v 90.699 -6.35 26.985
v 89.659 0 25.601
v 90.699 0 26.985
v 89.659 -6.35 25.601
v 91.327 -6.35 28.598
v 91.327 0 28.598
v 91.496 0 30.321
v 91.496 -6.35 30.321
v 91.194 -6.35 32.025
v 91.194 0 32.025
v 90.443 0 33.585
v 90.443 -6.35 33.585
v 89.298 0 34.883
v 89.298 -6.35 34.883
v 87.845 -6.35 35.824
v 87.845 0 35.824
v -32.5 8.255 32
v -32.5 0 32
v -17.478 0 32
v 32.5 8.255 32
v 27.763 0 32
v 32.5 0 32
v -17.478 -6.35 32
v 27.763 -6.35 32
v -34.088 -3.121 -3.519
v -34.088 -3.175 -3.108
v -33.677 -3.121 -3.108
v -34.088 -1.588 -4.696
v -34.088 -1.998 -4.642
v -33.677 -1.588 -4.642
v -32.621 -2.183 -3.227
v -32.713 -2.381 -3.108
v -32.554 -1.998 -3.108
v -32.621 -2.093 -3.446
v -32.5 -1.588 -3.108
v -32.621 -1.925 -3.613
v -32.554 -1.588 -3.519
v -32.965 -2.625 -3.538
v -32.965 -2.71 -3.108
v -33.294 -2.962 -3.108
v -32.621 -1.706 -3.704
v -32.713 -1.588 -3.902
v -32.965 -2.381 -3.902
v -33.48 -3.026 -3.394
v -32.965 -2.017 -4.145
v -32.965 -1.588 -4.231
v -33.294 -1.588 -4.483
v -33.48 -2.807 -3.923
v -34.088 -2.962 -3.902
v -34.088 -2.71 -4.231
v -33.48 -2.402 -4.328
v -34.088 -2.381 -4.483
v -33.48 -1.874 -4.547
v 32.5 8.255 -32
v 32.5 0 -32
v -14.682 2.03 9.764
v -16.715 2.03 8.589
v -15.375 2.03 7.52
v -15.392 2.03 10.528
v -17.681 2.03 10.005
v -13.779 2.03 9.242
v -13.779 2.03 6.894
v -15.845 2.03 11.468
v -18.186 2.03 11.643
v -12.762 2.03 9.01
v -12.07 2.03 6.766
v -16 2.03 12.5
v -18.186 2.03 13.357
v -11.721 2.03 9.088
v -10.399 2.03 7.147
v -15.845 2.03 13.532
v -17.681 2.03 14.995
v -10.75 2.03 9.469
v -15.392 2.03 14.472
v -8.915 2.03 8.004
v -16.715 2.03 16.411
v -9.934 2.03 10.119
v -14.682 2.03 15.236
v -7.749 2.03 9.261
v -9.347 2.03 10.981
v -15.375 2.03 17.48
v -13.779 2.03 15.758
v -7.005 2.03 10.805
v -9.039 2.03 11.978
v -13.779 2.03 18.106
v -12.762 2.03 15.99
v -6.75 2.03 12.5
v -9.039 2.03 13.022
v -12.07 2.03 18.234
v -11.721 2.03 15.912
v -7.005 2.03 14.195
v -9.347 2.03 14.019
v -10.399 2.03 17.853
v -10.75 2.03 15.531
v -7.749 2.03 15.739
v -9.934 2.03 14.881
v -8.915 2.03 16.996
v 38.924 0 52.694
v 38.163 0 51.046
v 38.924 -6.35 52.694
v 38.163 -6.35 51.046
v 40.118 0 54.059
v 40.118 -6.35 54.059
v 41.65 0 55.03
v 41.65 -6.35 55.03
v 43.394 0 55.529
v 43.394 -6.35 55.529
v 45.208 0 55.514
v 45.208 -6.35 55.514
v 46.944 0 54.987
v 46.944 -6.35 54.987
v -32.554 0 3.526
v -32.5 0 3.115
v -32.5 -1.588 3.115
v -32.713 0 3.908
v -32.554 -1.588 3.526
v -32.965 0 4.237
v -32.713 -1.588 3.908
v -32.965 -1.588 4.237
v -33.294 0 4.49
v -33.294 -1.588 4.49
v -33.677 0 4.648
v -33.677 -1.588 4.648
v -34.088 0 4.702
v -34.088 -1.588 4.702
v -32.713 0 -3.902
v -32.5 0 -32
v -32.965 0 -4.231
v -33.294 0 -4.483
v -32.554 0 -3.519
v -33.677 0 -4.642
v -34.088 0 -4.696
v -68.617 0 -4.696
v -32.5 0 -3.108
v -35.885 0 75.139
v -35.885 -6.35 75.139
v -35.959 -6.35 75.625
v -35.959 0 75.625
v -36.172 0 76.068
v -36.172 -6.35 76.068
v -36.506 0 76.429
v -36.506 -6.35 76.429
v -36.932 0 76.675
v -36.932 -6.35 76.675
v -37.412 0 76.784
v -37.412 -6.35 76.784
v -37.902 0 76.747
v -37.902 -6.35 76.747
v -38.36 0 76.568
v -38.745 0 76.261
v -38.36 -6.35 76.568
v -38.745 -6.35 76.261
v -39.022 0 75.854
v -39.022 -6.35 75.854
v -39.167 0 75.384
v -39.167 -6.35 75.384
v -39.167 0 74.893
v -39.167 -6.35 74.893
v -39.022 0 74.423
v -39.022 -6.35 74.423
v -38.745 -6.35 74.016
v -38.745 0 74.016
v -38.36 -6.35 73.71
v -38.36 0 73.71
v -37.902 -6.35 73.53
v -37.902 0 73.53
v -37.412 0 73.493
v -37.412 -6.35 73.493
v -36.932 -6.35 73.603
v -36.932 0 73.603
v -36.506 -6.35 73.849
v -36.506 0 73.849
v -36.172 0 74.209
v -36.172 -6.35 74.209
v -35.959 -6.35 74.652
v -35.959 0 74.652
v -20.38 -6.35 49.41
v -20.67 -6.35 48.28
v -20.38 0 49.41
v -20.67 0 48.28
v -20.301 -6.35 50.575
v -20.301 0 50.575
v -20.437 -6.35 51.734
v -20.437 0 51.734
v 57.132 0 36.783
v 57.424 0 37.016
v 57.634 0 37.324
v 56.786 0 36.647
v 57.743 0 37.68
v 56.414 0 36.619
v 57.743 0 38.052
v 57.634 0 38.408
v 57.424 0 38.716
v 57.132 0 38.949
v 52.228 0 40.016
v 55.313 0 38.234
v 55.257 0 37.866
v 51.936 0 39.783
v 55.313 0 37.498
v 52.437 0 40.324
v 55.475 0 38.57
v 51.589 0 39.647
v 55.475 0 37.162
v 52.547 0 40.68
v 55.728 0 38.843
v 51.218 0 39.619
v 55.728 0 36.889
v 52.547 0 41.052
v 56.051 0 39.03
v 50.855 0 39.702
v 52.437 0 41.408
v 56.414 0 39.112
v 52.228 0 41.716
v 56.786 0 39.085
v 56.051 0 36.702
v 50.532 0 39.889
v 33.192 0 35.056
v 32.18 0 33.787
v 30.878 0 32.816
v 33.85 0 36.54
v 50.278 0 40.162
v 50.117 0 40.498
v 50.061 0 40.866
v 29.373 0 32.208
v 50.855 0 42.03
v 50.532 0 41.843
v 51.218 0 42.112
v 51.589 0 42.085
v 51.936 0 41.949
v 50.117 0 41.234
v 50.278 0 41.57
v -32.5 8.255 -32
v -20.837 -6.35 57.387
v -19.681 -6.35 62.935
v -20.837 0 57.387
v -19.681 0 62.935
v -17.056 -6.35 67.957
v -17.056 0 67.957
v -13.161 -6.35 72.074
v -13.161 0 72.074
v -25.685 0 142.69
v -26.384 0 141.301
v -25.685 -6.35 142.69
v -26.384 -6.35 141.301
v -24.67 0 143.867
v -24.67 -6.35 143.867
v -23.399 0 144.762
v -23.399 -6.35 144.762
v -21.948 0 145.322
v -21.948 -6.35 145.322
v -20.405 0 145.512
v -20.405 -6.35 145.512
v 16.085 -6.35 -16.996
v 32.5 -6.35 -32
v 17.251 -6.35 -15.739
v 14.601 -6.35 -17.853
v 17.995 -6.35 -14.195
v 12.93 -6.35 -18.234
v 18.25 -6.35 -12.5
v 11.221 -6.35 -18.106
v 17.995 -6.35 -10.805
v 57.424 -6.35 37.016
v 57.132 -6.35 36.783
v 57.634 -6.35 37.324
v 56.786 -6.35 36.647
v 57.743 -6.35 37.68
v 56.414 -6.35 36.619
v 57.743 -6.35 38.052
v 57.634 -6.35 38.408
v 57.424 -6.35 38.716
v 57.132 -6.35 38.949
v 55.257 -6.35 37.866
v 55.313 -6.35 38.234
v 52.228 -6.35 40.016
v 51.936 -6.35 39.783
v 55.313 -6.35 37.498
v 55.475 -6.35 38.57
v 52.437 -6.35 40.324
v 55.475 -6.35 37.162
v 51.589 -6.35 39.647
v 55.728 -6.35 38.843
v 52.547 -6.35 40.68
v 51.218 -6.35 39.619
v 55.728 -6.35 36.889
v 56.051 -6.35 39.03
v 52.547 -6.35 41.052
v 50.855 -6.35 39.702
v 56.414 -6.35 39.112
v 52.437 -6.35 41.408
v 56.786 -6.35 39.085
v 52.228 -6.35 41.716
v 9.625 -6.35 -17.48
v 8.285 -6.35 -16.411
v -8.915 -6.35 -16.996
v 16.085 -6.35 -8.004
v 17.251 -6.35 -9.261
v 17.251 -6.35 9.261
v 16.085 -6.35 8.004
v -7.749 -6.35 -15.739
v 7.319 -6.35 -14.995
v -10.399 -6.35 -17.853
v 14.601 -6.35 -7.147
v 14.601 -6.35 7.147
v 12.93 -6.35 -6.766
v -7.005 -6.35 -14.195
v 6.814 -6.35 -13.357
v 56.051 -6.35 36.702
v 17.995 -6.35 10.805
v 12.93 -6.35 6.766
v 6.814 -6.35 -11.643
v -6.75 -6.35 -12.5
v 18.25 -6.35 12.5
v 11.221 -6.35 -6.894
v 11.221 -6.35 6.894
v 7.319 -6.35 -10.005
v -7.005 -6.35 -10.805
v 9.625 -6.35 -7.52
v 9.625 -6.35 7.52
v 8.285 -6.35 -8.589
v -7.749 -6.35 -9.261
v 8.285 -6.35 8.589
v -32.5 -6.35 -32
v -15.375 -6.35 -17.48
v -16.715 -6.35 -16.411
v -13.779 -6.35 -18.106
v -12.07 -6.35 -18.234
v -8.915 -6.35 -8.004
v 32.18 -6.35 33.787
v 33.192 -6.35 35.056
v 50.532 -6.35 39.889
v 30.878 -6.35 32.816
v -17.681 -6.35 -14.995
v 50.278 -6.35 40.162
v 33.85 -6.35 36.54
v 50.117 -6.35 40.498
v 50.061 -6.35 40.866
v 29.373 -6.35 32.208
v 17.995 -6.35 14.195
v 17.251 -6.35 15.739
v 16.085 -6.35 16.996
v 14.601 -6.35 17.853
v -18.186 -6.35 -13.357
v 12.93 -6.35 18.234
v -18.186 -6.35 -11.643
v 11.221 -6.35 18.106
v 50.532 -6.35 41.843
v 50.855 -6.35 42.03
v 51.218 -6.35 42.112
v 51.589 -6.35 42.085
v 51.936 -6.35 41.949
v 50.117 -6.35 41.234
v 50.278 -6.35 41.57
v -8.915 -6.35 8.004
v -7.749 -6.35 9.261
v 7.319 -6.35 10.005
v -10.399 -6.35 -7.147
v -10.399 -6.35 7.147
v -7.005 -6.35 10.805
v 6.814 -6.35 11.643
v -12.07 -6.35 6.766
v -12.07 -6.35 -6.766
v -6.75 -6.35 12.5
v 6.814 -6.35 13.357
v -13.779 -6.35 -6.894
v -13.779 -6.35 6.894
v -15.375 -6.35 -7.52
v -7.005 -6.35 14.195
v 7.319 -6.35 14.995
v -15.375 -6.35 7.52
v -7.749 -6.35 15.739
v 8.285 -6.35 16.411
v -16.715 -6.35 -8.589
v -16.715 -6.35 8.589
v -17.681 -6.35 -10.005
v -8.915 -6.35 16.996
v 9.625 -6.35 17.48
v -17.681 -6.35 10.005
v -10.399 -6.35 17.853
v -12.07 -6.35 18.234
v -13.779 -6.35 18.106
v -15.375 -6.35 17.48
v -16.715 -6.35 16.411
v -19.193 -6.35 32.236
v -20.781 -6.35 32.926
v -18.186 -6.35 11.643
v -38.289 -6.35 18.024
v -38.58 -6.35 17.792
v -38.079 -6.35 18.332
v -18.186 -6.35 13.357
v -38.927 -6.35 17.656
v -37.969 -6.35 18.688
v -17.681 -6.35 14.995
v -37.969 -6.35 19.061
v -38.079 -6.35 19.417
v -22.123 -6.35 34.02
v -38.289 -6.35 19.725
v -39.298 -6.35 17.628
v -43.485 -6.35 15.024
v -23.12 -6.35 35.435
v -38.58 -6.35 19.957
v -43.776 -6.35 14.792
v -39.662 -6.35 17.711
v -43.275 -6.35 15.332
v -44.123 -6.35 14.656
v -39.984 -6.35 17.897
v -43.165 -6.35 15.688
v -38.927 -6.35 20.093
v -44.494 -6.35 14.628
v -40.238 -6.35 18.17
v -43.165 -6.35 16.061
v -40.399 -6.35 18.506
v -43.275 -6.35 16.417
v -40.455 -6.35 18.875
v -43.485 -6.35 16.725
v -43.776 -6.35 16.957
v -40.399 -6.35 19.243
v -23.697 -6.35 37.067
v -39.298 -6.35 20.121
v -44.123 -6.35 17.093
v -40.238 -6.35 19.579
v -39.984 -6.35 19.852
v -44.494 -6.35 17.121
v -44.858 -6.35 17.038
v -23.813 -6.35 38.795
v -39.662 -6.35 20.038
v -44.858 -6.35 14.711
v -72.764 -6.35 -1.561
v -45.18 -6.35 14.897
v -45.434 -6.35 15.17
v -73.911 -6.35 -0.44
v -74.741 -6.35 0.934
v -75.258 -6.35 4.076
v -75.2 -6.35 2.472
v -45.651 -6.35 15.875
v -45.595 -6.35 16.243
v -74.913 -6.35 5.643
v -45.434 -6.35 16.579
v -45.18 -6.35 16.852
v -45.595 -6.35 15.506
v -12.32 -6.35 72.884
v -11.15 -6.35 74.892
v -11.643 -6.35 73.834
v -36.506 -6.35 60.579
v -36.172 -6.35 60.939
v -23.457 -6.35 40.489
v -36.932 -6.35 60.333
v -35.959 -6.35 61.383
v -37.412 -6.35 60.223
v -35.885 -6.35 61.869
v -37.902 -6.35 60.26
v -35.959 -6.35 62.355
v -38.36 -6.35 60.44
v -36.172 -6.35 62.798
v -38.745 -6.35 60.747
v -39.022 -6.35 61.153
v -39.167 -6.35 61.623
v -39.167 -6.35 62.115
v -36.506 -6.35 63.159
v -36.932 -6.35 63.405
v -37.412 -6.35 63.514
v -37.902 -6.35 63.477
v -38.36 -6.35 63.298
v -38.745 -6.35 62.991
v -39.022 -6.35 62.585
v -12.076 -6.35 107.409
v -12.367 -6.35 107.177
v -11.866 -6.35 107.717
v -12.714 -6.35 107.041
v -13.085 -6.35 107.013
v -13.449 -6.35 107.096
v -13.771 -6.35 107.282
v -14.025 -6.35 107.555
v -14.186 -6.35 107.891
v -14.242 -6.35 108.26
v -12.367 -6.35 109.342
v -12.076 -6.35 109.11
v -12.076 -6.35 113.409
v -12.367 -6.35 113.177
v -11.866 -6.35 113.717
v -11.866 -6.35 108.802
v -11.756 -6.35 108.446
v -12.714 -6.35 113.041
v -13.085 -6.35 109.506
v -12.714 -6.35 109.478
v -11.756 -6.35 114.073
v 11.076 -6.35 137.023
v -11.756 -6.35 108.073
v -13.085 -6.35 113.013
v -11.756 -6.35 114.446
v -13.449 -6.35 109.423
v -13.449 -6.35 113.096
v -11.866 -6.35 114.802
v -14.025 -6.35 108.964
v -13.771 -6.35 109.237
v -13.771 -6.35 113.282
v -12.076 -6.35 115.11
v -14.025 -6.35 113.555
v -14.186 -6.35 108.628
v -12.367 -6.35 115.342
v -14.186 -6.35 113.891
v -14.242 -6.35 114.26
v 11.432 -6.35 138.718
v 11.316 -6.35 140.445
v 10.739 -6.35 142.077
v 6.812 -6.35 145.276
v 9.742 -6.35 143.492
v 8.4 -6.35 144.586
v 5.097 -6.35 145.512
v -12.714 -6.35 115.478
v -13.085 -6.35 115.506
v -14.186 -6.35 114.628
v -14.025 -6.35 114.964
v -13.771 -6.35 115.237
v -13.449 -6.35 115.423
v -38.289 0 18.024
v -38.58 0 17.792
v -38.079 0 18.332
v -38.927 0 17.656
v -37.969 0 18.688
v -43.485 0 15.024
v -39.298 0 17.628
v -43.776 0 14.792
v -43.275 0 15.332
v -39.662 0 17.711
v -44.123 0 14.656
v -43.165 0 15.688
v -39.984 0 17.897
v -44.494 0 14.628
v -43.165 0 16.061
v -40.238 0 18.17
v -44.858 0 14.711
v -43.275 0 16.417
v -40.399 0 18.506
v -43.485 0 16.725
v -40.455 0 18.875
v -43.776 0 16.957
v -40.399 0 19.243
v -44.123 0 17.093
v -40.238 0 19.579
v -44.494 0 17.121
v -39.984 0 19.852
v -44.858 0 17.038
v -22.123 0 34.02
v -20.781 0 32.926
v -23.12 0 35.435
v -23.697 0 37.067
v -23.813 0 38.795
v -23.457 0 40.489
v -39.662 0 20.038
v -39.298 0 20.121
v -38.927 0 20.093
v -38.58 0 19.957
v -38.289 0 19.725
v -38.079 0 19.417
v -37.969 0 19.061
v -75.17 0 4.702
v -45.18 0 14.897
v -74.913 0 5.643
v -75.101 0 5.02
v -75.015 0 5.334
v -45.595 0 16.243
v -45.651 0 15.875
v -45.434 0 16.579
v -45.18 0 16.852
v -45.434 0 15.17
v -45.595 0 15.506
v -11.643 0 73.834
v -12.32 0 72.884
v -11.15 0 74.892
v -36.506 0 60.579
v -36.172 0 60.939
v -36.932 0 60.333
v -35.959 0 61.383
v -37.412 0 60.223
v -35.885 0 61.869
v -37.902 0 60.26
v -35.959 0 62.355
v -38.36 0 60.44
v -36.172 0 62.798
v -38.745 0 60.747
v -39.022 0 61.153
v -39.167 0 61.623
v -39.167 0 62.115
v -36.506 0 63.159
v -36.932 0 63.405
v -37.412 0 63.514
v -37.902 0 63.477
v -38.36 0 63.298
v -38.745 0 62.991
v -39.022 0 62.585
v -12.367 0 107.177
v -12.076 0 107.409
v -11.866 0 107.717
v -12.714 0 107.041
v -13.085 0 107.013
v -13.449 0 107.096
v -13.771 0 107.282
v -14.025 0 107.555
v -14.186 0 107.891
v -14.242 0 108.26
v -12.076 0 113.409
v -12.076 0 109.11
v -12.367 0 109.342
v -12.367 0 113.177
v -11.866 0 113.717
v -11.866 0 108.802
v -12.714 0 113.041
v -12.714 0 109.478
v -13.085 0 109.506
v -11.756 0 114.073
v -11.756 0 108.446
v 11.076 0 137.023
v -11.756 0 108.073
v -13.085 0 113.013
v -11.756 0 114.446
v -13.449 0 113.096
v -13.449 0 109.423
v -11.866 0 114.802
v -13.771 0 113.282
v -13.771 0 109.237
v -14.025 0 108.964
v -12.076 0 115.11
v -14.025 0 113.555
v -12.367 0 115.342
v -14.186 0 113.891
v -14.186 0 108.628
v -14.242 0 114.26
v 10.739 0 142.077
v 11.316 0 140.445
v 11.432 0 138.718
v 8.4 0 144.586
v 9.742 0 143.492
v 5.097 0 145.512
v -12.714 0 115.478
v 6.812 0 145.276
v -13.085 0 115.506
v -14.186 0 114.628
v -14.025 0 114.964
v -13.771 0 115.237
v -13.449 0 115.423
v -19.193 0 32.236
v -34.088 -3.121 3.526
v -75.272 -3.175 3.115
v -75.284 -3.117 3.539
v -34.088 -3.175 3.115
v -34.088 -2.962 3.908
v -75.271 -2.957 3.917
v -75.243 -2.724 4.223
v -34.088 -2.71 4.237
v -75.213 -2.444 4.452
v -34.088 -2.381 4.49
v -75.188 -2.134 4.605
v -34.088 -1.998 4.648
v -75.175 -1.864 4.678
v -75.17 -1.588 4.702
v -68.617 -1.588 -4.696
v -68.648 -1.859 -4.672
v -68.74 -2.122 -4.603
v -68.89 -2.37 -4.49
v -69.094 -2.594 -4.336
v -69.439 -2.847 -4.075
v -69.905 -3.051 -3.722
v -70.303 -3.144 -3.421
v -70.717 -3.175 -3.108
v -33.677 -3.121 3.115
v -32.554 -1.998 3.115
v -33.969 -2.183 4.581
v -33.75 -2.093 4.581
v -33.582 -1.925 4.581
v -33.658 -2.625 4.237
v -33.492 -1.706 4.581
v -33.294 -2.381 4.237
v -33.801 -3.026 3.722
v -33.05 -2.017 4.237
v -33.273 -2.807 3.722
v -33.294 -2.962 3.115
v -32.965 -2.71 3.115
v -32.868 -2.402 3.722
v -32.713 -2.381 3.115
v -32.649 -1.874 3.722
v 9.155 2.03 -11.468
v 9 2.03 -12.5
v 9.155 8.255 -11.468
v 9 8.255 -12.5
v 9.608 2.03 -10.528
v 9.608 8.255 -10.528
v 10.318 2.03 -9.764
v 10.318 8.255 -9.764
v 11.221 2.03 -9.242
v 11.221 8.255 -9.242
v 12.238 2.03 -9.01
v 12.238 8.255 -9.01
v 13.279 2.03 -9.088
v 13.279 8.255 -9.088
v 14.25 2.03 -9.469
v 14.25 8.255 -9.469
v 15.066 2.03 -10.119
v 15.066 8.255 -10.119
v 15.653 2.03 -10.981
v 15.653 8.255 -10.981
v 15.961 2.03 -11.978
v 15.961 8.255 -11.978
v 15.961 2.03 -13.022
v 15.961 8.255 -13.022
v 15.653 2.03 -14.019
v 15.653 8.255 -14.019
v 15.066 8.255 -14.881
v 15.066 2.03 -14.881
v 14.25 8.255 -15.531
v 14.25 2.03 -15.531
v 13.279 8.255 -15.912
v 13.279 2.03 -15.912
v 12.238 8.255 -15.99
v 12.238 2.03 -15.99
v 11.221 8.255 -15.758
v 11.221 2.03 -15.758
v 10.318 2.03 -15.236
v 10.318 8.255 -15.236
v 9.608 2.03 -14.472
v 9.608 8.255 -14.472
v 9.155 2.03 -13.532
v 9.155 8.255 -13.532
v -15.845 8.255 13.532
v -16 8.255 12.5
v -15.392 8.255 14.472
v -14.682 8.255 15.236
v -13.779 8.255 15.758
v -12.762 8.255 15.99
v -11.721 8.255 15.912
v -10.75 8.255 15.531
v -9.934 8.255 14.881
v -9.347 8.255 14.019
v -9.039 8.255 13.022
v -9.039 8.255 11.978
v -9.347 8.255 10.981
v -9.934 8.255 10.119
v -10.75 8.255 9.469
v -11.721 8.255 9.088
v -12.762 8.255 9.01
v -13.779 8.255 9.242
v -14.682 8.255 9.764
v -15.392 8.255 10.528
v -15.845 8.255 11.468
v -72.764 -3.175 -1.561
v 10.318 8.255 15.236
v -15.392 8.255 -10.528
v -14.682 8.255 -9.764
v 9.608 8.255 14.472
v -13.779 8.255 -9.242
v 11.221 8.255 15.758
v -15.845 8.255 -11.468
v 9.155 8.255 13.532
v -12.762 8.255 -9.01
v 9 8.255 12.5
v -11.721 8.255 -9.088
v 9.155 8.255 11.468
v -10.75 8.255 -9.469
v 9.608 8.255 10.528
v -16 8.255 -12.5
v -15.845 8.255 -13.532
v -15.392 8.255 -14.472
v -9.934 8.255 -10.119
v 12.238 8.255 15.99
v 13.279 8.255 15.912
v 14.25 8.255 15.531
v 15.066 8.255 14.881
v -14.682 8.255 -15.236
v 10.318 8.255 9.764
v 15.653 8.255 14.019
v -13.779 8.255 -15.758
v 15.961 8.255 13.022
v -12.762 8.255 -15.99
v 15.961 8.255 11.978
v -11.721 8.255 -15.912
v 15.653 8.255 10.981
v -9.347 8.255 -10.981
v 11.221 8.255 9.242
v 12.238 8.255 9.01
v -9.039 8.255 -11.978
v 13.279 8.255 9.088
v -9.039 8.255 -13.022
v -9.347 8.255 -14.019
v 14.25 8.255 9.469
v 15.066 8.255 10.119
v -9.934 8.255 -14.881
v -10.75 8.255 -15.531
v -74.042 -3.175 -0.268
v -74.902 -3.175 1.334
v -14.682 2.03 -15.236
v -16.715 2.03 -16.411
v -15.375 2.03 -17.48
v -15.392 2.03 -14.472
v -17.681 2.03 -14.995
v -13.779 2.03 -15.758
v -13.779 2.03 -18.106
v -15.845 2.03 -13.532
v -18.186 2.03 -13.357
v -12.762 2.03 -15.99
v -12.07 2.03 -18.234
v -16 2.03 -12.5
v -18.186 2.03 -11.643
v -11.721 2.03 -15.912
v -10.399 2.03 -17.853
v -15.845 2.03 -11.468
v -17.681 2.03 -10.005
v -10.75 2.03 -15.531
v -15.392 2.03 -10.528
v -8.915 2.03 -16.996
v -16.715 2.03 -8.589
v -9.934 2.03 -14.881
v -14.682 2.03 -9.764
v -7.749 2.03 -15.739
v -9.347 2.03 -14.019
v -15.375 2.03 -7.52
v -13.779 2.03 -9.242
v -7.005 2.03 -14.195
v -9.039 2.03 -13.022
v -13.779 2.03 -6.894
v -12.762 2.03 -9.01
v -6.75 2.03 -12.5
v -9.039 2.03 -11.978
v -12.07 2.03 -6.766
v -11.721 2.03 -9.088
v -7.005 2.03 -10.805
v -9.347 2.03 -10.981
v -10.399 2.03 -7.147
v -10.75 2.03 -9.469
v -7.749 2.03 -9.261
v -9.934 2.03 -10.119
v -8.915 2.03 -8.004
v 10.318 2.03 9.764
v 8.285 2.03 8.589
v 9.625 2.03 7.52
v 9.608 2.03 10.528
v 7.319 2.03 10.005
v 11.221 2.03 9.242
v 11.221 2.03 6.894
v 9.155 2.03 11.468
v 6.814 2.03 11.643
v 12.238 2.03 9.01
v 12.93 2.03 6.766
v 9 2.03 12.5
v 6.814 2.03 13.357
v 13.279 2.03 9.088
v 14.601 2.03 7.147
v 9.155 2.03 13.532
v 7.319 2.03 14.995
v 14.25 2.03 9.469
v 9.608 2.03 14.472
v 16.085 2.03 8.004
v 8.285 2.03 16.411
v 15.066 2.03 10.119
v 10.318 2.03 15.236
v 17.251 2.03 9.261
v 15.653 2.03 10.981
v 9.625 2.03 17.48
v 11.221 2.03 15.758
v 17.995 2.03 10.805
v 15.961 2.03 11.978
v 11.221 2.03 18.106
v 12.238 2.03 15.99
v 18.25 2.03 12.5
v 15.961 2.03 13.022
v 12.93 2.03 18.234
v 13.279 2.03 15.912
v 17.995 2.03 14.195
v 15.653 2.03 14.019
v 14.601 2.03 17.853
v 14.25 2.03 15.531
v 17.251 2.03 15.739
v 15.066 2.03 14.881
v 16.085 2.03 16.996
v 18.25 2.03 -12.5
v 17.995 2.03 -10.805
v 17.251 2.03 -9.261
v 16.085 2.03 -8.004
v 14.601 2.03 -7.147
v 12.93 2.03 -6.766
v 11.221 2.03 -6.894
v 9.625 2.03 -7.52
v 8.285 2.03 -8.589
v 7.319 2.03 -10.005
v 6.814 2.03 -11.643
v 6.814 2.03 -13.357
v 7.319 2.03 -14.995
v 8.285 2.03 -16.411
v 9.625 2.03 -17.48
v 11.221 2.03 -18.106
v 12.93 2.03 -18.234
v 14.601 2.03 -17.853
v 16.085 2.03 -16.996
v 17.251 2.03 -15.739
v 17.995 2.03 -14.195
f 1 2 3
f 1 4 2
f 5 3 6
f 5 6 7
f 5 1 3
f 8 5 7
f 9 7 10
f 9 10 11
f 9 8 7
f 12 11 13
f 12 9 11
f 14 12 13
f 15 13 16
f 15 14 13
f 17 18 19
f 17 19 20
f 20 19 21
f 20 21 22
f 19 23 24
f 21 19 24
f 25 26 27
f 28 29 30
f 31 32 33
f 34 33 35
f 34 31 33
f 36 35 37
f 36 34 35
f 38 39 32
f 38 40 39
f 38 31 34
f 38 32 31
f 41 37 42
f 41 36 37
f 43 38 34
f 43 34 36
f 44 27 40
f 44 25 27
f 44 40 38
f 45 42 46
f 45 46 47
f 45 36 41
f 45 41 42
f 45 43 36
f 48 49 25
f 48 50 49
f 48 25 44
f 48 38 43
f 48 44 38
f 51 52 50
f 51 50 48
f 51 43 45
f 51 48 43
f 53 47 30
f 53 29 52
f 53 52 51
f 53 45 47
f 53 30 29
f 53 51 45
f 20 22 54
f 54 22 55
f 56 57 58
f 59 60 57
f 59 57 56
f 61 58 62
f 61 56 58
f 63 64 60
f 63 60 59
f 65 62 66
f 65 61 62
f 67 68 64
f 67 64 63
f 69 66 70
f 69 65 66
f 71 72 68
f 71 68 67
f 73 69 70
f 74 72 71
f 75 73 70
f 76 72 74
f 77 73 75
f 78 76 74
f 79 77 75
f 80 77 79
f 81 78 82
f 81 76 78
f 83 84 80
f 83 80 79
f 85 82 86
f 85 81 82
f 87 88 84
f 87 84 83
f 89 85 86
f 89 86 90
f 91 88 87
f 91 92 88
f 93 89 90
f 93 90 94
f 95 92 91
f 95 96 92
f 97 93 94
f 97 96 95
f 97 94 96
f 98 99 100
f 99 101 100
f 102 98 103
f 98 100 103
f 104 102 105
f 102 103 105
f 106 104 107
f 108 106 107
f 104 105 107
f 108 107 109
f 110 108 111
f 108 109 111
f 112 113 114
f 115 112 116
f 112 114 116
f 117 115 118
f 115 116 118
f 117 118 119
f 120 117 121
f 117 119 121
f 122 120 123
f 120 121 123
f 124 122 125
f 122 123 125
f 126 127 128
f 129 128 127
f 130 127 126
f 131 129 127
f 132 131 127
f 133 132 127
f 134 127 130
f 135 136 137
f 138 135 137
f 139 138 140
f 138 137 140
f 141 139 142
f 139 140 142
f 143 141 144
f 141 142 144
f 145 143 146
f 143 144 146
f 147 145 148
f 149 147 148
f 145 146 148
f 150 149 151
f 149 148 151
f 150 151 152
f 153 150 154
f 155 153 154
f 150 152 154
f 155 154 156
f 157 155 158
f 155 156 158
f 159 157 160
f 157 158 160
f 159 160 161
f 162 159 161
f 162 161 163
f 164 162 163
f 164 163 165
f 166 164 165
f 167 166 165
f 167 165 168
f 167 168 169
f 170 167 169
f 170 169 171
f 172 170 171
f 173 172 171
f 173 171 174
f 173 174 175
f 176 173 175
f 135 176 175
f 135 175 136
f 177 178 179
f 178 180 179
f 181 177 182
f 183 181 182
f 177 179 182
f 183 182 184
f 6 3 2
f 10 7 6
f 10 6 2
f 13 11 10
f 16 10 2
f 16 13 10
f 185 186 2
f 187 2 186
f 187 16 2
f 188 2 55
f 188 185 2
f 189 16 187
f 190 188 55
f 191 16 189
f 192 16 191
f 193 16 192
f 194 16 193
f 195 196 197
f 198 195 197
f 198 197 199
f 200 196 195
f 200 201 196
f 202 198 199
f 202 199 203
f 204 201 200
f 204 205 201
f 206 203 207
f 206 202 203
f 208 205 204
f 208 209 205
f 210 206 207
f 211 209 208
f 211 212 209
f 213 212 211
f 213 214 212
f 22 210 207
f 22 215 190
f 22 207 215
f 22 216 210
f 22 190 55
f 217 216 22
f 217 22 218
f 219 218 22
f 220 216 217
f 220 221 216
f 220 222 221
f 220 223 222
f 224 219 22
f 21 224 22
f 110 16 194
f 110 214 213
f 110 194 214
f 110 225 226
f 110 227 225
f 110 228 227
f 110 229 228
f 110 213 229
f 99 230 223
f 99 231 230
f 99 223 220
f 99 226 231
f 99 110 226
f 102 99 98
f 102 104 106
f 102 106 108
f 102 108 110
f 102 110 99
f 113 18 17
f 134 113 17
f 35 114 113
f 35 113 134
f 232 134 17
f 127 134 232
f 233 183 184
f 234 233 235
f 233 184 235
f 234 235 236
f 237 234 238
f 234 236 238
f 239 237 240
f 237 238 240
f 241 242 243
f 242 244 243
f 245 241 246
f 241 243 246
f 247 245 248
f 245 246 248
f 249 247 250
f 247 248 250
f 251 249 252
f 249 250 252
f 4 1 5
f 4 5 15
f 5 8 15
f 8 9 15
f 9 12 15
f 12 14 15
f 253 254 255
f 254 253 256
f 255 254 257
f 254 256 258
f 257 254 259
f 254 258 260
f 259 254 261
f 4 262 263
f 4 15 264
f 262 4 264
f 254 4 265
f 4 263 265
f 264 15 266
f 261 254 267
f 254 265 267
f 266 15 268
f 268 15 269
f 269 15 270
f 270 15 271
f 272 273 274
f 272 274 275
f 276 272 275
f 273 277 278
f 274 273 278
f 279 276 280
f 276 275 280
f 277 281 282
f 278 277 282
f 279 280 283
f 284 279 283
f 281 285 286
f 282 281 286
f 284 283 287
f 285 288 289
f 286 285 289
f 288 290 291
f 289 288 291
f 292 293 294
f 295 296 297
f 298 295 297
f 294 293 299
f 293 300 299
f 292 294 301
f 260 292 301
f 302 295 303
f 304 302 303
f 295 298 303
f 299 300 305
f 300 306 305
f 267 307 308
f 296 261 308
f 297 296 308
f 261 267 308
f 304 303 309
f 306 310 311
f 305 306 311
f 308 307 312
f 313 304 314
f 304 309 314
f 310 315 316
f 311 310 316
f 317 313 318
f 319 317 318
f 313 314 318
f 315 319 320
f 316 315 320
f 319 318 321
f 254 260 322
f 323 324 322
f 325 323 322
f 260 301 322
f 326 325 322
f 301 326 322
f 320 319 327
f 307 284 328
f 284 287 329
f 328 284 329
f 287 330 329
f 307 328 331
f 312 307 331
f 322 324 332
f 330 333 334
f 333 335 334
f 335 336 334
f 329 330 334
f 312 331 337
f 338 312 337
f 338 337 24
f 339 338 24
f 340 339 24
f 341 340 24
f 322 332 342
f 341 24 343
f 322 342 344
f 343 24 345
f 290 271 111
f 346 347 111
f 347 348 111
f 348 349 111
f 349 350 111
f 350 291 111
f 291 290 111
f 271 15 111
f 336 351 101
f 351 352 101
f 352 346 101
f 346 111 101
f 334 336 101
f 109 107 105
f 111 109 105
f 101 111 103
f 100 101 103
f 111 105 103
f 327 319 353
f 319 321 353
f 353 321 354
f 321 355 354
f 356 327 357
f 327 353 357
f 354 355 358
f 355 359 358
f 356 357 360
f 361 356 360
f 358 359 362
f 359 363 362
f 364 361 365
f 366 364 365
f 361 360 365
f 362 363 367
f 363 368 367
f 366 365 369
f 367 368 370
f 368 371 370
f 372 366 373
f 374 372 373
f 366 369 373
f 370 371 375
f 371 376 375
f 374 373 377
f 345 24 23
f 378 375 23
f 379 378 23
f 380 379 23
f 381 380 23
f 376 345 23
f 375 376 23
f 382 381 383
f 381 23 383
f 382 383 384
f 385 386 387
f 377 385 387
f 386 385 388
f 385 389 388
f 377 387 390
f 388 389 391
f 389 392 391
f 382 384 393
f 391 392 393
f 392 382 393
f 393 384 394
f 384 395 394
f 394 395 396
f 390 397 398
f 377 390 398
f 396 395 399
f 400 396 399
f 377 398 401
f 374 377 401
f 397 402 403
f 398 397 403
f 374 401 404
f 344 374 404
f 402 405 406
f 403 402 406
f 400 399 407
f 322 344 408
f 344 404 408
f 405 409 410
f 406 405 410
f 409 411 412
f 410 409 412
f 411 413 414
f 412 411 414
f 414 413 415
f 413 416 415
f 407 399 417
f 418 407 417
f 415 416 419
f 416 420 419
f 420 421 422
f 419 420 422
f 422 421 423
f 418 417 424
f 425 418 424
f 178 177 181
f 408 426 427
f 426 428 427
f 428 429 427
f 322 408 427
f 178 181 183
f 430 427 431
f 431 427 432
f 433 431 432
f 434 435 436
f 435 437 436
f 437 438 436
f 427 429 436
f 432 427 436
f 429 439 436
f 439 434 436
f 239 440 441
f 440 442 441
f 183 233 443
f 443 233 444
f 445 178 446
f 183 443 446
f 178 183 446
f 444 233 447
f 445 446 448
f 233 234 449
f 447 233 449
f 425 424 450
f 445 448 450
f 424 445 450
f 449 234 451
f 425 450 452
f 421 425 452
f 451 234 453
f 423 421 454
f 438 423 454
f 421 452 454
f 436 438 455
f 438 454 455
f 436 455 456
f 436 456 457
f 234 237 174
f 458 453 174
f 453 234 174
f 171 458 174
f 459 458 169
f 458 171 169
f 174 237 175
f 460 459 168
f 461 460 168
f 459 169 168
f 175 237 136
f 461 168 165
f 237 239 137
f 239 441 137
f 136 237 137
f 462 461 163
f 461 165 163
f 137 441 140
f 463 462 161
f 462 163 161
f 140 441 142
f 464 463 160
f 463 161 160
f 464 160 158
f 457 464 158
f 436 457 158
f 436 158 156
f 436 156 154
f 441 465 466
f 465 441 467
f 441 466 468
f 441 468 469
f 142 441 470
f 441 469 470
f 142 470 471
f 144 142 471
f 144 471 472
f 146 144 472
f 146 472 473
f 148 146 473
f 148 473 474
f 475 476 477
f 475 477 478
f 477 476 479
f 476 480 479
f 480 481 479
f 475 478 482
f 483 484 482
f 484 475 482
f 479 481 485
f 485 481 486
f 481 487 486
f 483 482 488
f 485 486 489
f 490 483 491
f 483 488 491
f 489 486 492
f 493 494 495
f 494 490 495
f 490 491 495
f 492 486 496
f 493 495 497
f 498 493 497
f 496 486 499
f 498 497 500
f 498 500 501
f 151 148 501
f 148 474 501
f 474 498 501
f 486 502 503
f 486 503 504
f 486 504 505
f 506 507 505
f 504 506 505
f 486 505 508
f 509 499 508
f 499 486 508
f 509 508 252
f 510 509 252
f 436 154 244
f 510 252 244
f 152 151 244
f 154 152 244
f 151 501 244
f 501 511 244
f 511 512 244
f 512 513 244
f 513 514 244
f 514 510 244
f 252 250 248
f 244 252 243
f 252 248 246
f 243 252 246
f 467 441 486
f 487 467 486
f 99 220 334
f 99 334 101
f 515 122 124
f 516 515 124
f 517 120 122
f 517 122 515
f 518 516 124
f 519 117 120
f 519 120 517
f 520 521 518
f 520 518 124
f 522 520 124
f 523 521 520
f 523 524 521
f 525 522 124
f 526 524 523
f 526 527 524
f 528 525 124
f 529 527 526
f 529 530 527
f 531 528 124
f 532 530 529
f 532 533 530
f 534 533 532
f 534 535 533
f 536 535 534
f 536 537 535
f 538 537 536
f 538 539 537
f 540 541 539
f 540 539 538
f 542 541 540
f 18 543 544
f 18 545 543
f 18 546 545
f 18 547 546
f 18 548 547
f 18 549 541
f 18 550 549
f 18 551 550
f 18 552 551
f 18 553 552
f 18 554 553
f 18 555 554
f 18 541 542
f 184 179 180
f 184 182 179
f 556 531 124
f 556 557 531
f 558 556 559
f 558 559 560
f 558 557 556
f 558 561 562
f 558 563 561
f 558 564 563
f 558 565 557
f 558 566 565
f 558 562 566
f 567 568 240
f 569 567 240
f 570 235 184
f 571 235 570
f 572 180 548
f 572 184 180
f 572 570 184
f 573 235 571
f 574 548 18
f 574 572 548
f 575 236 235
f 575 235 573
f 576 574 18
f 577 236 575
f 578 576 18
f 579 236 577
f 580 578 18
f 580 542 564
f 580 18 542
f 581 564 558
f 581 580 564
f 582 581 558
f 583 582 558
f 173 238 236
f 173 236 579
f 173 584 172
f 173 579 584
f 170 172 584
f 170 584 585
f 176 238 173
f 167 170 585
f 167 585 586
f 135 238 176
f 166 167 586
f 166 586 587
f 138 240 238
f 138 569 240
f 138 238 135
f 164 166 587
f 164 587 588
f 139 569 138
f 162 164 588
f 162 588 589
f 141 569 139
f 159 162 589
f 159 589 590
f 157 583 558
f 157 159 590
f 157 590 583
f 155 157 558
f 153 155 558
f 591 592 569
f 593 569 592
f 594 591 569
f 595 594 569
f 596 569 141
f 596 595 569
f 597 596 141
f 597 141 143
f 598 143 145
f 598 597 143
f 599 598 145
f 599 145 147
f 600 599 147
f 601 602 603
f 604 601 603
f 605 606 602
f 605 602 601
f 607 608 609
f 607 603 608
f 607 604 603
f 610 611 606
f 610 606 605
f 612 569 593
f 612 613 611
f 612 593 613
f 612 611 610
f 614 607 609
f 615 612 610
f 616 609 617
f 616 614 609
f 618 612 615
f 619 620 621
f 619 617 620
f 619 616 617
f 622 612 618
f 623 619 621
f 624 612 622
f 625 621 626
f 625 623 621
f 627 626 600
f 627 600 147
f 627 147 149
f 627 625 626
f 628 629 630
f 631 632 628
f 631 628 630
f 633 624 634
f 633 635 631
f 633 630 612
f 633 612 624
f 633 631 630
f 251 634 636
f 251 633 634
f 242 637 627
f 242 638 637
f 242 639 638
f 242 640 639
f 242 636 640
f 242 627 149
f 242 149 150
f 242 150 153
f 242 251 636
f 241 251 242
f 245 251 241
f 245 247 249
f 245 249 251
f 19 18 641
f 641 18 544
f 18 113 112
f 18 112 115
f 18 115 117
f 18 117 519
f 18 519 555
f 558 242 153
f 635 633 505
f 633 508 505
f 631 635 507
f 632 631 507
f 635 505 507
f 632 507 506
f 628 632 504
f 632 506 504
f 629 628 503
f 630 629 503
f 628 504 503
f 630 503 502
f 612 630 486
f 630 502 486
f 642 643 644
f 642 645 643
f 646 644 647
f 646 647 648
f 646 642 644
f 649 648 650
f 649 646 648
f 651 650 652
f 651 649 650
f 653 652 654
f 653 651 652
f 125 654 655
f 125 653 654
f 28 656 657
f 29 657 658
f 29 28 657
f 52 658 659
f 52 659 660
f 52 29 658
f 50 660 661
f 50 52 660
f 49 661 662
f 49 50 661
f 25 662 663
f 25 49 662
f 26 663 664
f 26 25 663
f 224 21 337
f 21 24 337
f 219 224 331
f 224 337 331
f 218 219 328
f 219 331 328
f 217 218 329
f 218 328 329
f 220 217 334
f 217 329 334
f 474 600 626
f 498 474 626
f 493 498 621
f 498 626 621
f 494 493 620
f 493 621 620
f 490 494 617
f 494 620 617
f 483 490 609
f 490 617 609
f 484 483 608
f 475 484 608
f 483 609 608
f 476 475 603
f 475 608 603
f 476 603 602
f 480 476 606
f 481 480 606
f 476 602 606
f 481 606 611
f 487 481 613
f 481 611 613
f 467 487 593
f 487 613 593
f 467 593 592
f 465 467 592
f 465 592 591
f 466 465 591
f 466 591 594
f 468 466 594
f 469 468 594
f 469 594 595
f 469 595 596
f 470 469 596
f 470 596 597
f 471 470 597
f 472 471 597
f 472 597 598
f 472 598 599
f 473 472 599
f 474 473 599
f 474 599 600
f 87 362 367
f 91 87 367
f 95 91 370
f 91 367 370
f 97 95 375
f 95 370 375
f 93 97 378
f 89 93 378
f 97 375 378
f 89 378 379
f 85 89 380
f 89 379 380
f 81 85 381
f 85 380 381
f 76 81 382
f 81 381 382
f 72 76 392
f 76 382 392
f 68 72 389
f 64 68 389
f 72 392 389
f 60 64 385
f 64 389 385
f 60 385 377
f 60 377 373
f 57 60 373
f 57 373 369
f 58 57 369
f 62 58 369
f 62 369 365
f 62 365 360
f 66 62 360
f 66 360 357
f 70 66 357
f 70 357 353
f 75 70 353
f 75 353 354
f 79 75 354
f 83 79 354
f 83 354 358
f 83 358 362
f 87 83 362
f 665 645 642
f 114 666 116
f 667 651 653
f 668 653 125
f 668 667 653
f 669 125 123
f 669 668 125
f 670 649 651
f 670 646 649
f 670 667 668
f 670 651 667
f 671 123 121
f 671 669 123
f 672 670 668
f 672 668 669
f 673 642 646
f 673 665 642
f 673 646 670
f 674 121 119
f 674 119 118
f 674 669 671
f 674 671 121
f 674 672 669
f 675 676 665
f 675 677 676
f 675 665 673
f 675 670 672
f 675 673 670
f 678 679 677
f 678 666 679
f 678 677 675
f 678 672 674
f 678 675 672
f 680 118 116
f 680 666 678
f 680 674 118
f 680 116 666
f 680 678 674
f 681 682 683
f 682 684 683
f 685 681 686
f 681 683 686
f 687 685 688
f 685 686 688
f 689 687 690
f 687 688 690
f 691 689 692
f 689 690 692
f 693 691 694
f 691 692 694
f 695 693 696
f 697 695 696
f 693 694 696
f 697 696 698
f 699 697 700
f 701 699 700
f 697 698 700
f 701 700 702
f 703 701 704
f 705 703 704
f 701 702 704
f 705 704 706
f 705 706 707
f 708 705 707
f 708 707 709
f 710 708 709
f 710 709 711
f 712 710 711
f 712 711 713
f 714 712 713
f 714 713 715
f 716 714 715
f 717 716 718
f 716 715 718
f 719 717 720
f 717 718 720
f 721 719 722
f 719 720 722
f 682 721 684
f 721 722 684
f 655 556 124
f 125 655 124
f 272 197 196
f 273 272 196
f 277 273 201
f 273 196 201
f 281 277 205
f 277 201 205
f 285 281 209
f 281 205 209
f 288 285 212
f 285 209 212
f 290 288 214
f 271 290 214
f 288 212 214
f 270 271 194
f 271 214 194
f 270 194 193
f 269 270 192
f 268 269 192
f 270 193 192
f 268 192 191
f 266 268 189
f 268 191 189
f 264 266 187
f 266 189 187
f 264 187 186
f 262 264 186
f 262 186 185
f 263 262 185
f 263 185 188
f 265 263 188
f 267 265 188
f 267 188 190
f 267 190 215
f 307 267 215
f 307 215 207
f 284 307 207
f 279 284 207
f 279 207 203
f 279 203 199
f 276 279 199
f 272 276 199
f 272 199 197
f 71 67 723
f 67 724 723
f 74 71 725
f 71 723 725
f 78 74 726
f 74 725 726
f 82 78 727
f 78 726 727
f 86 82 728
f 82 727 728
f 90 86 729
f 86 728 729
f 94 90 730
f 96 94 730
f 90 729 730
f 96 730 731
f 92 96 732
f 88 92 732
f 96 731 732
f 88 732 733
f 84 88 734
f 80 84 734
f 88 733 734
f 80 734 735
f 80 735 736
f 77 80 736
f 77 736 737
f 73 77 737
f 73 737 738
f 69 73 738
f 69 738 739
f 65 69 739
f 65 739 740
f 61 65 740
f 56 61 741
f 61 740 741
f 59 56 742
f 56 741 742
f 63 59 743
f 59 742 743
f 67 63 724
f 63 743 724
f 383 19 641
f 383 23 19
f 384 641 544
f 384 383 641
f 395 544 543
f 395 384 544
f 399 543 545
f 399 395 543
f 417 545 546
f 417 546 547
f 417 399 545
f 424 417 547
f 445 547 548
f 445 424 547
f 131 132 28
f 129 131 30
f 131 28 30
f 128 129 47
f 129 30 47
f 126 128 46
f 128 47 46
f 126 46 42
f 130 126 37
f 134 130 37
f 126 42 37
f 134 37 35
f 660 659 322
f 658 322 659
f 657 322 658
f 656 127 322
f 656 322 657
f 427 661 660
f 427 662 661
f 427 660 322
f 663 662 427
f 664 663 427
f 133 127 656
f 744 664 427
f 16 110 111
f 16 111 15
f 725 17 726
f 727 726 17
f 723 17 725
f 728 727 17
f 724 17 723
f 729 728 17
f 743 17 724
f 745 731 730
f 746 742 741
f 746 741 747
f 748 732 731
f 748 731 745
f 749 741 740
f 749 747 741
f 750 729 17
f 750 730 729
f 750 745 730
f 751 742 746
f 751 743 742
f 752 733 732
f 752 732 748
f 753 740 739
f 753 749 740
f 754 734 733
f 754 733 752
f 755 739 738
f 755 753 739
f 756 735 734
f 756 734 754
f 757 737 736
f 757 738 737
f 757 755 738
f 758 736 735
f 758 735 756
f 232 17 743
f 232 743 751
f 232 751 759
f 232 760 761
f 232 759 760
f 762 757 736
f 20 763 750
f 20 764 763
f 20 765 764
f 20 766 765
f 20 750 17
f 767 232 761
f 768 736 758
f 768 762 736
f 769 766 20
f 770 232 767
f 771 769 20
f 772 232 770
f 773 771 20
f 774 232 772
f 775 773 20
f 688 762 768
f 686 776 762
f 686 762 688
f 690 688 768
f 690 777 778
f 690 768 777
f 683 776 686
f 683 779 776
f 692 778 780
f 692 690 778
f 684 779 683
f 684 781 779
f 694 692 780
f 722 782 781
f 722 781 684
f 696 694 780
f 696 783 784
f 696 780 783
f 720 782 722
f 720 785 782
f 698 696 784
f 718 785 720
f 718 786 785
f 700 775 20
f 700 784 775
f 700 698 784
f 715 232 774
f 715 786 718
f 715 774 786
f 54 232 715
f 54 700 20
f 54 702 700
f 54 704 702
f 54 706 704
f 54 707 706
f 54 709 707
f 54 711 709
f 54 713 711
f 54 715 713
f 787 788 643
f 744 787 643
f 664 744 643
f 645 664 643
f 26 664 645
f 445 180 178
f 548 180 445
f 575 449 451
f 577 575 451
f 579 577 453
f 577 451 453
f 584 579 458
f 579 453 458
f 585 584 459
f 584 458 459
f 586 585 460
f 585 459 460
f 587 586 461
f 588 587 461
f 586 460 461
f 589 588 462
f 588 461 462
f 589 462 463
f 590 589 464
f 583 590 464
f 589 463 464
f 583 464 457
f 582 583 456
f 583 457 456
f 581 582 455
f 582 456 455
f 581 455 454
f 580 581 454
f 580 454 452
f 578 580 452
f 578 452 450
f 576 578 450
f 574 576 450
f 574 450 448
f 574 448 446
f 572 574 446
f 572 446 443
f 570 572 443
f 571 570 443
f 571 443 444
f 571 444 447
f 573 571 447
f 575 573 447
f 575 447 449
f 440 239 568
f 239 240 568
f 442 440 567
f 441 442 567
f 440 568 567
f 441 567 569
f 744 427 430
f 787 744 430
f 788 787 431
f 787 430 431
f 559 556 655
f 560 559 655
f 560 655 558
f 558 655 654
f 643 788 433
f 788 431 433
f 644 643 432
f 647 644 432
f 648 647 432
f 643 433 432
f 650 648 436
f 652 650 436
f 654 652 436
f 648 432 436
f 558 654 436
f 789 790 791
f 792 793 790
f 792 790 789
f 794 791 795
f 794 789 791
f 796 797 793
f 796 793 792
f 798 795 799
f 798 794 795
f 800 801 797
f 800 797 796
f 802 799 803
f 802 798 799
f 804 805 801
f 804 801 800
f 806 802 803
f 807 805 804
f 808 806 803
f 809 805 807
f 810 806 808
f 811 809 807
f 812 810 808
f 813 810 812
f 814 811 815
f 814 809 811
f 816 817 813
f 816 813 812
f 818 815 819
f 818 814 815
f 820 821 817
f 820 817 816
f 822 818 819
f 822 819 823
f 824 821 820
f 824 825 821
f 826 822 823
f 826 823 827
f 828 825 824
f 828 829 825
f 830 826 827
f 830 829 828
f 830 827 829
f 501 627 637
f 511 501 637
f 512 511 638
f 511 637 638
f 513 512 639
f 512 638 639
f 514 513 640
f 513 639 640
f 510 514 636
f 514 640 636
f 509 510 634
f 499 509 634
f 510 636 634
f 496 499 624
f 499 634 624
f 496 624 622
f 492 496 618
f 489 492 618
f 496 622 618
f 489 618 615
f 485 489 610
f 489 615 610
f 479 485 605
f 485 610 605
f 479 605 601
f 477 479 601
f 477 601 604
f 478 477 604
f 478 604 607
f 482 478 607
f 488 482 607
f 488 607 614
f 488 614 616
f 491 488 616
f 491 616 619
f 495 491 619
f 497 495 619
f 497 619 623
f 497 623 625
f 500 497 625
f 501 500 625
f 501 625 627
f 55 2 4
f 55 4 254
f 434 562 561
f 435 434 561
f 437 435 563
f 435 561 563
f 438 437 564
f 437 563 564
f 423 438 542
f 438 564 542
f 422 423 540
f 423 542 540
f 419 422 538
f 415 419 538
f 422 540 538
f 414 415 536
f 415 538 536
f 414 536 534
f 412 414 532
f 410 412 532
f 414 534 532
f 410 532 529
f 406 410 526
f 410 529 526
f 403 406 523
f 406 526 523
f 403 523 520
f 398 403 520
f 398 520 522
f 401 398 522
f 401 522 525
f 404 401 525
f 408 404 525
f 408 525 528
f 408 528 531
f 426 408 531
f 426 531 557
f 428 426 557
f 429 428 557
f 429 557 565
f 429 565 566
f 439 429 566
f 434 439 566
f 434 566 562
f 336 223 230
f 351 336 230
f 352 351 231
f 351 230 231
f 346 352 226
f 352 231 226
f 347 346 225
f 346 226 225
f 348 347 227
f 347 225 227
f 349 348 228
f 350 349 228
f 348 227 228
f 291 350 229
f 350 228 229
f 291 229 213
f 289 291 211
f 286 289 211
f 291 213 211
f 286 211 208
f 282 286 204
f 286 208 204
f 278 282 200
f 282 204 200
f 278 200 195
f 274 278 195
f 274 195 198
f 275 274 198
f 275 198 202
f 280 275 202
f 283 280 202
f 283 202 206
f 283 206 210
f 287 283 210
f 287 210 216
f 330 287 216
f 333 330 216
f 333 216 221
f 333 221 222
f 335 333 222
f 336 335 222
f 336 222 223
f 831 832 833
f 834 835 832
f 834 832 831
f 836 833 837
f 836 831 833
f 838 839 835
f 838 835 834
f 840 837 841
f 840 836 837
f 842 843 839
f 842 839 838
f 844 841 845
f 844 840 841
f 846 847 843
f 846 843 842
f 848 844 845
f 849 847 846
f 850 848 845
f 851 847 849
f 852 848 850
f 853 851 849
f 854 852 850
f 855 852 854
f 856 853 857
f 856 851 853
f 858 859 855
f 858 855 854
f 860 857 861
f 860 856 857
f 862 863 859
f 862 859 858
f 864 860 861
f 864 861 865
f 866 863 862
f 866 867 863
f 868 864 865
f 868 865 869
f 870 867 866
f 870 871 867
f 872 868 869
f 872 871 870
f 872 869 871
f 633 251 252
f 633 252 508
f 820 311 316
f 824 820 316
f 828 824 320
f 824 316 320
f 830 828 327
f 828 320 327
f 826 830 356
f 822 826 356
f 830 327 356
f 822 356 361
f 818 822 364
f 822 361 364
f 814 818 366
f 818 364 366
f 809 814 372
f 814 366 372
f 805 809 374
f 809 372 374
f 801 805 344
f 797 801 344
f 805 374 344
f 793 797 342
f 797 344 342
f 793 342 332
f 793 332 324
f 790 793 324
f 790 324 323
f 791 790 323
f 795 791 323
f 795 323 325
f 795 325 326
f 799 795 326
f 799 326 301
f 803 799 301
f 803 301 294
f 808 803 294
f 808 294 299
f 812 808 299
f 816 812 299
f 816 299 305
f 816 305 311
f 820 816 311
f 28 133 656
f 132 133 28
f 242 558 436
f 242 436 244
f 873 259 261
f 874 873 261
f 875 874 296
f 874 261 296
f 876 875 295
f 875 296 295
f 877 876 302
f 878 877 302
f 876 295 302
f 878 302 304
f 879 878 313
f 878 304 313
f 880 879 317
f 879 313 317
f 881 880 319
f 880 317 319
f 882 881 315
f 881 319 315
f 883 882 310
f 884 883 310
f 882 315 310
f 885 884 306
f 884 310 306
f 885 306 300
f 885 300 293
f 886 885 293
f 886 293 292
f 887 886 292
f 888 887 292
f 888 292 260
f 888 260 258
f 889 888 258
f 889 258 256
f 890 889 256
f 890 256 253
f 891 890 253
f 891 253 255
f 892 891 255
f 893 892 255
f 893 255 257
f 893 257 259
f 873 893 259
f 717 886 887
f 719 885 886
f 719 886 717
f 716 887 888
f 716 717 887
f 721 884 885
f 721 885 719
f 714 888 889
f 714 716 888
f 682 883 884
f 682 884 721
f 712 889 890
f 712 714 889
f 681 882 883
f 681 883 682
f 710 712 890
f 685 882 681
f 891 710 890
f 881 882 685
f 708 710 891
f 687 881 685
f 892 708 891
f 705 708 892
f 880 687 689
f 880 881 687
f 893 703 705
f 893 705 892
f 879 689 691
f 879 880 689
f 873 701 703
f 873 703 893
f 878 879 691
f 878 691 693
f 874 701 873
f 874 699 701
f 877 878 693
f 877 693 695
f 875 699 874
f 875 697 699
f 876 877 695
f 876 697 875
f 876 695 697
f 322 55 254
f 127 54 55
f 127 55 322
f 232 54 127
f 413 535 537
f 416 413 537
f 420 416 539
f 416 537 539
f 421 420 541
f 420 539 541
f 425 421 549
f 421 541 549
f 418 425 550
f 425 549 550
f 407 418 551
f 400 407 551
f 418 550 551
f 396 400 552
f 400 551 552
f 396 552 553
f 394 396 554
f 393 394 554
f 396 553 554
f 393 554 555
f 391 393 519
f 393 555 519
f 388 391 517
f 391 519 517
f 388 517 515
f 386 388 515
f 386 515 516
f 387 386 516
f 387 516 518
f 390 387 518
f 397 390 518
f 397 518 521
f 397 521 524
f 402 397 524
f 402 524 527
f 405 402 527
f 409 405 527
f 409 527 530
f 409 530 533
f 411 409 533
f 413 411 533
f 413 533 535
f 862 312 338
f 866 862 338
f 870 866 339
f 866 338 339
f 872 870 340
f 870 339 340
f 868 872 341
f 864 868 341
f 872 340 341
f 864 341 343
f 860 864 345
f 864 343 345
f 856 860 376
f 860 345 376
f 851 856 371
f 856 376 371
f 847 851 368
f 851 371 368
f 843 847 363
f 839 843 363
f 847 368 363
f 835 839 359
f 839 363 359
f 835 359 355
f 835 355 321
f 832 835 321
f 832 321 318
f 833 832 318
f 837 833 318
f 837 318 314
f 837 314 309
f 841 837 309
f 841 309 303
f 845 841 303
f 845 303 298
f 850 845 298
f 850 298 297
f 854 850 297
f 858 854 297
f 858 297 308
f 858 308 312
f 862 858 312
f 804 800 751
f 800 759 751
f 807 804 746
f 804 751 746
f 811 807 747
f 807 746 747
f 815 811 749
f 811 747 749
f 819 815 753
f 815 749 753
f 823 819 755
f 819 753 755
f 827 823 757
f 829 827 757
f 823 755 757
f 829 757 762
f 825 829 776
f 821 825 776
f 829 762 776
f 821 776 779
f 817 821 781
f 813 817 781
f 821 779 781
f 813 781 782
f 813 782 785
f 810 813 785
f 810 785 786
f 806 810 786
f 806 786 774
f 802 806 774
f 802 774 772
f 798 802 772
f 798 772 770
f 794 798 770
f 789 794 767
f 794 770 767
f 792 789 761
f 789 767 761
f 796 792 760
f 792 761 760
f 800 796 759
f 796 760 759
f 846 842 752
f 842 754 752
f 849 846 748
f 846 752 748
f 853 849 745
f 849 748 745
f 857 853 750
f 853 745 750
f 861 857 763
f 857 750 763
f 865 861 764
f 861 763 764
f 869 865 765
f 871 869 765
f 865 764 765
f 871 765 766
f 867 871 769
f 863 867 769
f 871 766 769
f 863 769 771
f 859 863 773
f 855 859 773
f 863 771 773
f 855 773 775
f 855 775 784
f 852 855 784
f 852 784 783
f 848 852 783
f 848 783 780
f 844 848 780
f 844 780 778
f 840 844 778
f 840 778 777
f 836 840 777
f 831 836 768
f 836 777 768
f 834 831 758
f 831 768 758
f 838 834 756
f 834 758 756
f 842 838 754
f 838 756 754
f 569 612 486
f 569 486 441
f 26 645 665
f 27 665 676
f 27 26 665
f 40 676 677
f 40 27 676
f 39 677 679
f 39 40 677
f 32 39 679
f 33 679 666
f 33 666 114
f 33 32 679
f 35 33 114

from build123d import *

# Parameters (mm, degrees)
SKETCH1_W                       = 65
SKETCH1_H                       = 64
EXTRUDE1_DEPTH                  = 8.255
EXTRUDE2_DEPTH                  = 6.35
FILLET1_R                       = 6.35
CBORE_FOR_M6_SBHCS1_D           = 7
CBORE_FOR_M6_SBHCS1_CBORE_D     = 11.5
CBORE_FOR_M6_SBHCS1_CBORE_DEPTH = 8.38
M3X0_5_TAPPED_HOLE1_D           = 2.5
M4X0_7_TAPPED_HOLE1_D           = 3.3
SKETCH10_W                      = 45.157529952
SKETCH10_H                      = 9.398
CUT_EXTRUDE1_DEPTH              = 3.175
FILLET2_R                       = 1.5875
SKETCH11_R                      = 20.588537239
CUT_EXTRUDE2_DEPTH              = 173.088346863
FILLET3_R                       = 6.35


with BuildPart() as part:
    # Sketch1 → Extrude1 (new body)
    with BuildSketch(Plane(origin=(0, 0, 0), x_dir=(1, 0, 0), z_dir=(0, 1, 0))):
        Rectangle(SKETCH1_W, SKETCH1_H)
    extrude(amount=EXTRUDE1_DEPTH)

    # Sketch3 → Extrude2 (add)
    with BuildSketch(Plane.XZ):
        Polygon((-32.5, -32), (-76.484147351, 1.251326619), (-24.877631504, 145.512128668), (14.112838434, 145.512128668), (-26.493933355, 32), (32.5, 32), (40.26552936, 58.115798324), (96.00808235, 32), (32.5, -32), align=None)
    extrude(amount=EXTRUDE2_DEPTH)

    # Fillet1
    fillet1_edges = [part.edges().sort_by_distance(p)[0] for p in [
        (96.00808235, -3.175, 32),
        (40.26552936, -3.175, 58.115798324),
        (32.5, -3.175, 32),
        (-26.493933355, -3.175, 32),
        (-76.484147351, -3.175, 1.251326619),
        (-24.877631504, -3.175, 145.512128668),
        (14.112838434, -3.175, 145.512128668),
    ]]
    fillet(fillet1_edges, radius=FILLET1_R)

    # CBORE for M6 SBHCS1 (through all)
    with Locations(Plane.XZ.offset(6.35)):
        with Locations((-12.5, 12.5), (12.5, 12.5), (12.5, -12.5), (-12.5, -12.5)):
            CounterBoreHole(CBORE_FOR_M6_SBHCS1_D / 2, CBORE_FOR_M6_SBHCS1_CBORE_D / 2, CBORE_FOR_M6_SBHCS1_CBORE_DEPTH)

    # M3x0.5 Tapped Hole1 (through all)
    with Locations(Plane.XZ.offset(6.35)):
        with Locations((-12.991981474, 114.259500014), (-12.991981474, 108.259500014), (51.311236439, 40.865980186), (56.507388862, 37.865980186), (-39.204872739, 18.874519842), (-44.401025162, 15.874519842)):
            Hole(M3X0_5_TAPPED_HOLE1_D / 2)

    # M4x0.7 Tapped Hole1 (through all)
    with Locations(Plane(origin=(0, 0, 0), x_dir=(-1, 0, 0), z_dir=(0, 1, 0))):
        with Locations((37.535205925, 75.138578877), (37.535205925, 61.868858743)):
            Hole(M4X0_7_TAPPED_HOLE1_D / 2)

    # Sketch10 → Cut-Extrude1 (cut)
    with BuildSketch(Plane(origin=(0, 0, 0), x_dir=(1, 0, 0), z_dir=(0, 1, 0))):
        with Locations((-55.078764976, -0.003190653)):
            Rectangle(SKETCH10_W, SKETCH10_H)
    extrude(amount=-CUT_EXTRUDE1_DEPTH, mode=Mode.SUBTRACT)

    # Fillet2
    fillet2_edges = [part.edges().sort_by_distance(p)[0] for p in [
        (-50.558701218, -3.175, -4.695809347),
        (-32.5, -3.175, 0.003190653),
        (-32.5, -1.5875, -4.695809347),
        (-53.835070304, -3.175, 4.702190653),
        (-32.5, -1.5875, 4.702190653),
    ]]
    fillet(fillet2_edges, radius=FILLET2_R)

    # Sketch11 → Cut-Extrude2 (cut, through all)
    with BuildSketch(Plane(origin=(0, 0, 0), x_dir=(-1, 0, 0), z_dir=(0, 1, 0))):
        with Locations((0.295205925, 56.000000014)):
            Circle(SKETCH11_R)
    extrude(amount=-CUT_EXTRUDE2_DEPTH, mode=Mode.SUBTRACT)

    # Fillet3
    fillet3_edges = [part.edges().sort_by_distance(p)[0] for p in [
        (-20.019691254, -3.175, 50.098089803),
        (-11.80057866, -3.175, 73.07378881),
    ]]
    fillet(fillet3_edges, radius=FILLET3_R)


solid = part.part
